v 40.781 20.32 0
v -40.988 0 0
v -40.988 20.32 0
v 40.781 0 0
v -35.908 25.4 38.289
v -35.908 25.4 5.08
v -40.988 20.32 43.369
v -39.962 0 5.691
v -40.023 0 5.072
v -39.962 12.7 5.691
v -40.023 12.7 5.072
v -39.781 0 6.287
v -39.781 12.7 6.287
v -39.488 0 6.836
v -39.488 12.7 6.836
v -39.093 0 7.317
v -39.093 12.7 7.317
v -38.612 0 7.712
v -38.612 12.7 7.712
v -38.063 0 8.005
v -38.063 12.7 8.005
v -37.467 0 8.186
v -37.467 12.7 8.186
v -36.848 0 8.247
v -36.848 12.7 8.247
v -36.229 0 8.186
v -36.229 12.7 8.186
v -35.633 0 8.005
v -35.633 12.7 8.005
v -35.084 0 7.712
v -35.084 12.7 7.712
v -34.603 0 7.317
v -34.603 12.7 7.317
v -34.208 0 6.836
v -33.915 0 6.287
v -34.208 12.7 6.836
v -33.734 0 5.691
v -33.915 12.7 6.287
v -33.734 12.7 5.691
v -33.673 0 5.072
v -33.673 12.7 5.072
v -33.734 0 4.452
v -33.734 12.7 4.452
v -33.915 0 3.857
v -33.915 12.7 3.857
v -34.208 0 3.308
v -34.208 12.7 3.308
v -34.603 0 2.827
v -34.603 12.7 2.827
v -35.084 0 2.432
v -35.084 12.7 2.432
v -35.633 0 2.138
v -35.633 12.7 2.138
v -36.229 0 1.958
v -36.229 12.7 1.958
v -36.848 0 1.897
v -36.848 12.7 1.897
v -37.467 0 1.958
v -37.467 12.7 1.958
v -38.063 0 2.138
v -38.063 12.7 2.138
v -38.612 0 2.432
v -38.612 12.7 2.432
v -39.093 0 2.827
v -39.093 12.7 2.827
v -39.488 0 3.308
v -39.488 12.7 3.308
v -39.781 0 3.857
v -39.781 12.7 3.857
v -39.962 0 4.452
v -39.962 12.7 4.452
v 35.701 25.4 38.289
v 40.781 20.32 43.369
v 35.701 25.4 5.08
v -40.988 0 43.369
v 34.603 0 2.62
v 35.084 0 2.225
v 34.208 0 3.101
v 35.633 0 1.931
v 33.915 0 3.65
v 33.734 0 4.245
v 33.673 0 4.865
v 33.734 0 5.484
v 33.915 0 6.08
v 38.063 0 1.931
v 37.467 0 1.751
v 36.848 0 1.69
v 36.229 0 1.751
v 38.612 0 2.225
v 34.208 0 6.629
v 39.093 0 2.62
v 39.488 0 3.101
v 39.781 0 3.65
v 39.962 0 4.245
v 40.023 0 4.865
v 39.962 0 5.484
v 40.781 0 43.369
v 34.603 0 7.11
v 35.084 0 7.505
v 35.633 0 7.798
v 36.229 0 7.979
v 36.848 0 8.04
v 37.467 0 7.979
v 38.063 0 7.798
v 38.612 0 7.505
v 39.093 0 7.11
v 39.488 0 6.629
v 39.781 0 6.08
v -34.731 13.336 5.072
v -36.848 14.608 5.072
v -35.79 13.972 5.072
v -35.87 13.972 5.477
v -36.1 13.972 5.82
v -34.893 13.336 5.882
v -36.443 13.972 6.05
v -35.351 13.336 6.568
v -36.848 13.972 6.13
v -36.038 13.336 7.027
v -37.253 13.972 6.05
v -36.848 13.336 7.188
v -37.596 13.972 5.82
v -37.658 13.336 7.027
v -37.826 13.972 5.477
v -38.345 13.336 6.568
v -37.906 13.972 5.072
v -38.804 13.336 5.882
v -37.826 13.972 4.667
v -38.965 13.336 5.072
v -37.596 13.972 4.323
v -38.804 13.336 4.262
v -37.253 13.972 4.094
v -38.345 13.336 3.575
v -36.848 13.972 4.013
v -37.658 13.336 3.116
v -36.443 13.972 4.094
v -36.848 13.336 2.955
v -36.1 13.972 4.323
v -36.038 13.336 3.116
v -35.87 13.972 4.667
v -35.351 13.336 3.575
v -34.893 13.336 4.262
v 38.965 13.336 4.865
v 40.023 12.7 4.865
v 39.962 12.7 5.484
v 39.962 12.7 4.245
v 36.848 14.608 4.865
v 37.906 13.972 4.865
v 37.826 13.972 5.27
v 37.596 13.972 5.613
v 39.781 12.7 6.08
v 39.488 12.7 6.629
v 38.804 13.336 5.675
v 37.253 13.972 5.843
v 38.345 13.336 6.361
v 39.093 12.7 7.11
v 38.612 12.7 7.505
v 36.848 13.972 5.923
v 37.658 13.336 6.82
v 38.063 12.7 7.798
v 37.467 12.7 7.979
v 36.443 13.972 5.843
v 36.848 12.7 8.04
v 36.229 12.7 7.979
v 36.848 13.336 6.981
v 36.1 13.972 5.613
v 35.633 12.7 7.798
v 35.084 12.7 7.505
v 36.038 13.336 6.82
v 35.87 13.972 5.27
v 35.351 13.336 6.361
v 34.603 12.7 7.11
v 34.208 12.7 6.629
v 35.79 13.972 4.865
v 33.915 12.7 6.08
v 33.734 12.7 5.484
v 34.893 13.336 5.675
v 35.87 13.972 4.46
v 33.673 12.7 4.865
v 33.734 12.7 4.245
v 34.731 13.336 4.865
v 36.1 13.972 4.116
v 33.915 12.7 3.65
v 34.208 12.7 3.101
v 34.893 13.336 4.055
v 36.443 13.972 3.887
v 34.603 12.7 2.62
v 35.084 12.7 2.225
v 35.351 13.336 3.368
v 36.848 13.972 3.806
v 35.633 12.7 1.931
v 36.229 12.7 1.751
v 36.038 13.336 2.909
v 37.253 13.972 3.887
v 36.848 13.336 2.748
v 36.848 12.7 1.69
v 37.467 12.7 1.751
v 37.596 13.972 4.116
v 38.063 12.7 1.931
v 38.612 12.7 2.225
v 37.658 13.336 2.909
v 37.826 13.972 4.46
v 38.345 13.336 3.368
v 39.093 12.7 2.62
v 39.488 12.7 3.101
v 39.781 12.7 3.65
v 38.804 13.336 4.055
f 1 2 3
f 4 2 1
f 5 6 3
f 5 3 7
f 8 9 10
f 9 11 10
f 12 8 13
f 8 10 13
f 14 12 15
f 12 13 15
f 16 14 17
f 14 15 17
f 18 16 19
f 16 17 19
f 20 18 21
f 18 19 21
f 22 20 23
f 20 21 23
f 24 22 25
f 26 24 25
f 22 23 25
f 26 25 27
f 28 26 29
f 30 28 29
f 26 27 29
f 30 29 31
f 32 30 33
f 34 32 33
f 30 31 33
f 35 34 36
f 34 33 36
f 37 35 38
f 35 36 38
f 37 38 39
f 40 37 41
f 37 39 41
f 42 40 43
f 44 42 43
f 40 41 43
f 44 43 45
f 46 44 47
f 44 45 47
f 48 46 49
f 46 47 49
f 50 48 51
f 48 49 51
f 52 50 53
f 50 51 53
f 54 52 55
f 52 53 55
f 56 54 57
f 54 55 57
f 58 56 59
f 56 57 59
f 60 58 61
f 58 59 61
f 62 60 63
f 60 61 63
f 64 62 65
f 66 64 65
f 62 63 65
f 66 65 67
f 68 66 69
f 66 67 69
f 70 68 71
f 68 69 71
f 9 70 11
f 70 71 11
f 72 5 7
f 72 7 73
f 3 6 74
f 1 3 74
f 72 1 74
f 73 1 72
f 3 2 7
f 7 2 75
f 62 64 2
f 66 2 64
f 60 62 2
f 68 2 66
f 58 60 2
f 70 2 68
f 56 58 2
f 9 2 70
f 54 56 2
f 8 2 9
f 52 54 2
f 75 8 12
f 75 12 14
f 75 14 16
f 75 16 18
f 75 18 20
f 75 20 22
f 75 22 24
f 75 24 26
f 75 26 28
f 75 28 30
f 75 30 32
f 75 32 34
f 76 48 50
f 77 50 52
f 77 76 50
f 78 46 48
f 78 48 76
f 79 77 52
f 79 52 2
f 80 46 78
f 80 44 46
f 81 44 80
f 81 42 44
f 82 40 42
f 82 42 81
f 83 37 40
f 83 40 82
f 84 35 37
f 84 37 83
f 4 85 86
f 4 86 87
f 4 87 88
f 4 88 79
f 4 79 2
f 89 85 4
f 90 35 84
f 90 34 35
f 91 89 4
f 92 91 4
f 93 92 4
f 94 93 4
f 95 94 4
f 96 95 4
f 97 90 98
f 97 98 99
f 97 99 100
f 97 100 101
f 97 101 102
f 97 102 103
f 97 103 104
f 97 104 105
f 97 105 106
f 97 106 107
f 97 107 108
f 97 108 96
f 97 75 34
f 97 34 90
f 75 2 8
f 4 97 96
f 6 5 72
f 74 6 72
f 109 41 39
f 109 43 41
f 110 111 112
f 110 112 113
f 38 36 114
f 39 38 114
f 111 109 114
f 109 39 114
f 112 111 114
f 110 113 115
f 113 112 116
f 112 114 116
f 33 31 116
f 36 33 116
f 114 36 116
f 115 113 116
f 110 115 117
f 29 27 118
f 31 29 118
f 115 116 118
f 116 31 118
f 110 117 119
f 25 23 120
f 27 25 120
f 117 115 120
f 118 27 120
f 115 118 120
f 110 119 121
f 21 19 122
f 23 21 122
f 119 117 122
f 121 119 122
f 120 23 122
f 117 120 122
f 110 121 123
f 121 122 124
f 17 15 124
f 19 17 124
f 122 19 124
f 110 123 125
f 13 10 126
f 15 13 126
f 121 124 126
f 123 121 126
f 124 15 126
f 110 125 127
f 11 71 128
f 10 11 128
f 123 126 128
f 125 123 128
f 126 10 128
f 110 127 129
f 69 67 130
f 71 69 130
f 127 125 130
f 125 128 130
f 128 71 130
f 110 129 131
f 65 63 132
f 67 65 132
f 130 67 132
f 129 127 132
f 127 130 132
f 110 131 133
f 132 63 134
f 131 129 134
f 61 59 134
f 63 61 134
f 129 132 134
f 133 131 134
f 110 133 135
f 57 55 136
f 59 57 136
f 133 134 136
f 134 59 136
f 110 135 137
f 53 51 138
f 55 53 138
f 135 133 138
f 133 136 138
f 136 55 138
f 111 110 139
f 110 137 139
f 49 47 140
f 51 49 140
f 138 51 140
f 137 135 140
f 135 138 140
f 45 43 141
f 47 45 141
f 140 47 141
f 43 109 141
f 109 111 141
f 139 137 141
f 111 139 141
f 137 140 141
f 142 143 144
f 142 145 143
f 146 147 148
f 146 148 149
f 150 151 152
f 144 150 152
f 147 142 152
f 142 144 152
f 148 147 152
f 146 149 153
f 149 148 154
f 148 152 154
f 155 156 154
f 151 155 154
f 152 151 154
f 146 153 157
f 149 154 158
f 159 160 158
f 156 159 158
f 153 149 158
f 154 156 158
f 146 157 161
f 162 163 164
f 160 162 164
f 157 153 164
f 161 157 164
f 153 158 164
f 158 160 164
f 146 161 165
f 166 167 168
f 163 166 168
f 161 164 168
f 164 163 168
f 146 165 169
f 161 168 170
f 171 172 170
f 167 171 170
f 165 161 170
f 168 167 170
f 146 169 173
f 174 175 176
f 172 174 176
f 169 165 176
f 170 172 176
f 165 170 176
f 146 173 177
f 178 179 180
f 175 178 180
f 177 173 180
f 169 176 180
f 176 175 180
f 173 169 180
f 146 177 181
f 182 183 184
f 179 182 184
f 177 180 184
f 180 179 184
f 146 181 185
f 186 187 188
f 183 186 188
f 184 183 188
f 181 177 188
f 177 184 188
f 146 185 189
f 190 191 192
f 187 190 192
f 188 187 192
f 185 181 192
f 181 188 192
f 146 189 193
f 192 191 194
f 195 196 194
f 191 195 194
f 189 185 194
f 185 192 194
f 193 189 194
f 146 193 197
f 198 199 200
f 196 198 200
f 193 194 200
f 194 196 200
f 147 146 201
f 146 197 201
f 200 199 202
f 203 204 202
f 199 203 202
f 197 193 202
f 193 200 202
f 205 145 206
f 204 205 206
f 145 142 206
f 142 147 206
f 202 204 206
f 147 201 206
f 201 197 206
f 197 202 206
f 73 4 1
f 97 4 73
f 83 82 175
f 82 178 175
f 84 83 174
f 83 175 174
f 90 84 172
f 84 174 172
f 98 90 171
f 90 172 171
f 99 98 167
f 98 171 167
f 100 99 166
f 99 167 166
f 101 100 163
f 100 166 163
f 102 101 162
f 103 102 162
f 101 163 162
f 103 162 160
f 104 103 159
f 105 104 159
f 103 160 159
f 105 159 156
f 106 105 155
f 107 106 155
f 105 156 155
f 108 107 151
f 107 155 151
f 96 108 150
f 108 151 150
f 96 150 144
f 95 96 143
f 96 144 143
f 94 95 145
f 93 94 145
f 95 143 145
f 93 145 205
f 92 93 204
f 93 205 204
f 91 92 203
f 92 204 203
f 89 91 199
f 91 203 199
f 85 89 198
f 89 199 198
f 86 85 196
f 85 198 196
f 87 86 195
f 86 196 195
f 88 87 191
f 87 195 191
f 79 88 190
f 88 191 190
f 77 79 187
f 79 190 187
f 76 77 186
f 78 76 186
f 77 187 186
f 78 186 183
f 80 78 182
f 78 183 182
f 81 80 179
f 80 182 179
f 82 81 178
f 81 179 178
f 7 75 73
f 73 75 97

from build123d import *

# Parameters (mm, degrees)
F0_W     = 81.7696005106
F0_H     = 43.3689393103
F1_DEPTH = 25.4
F3_D     = 6.35
F3_DEPTH = 12.7
F3_TIP   = 1.9077324654
F5_SIZE  = 5.08


# Not quite as in the source:
# - the program builds the solid bodies; features that only make, move or delete a surface that nothing else refers to are left out


with BuildPart() as f1:
    # F0 (on Front) → F1 (new body)
    with BuildSketch(Plane.XZ):
        with Locations((-0.1035071909, 21.6844696552)):
            Rectangle(F0_W, F0_H)
    extrude(amount=-F1_DEPTH)

    # F3
    with Locations(Plane.XZ):
        with Locations((36.8480719626, 4.8647737131), (-36.8480719626, 5.071785301)):
            Hole(F3_D / 2, depth=F3_DEPTH)
            with Locations((0, 0, -(F3_DEPTH + F3_TIP / 2))):  # 118° drill point
                Cone(0, F3_D / 2, F3_TIP, mode=Mode.SUBTRACT)

    # F5
    f5_edges = [f1.edges().sort_by_distance(p)[0] for p in [
        (-40.988307, 25.4, 21.68447),
        (-0.103507, 25.4, 0),
        (40.781293, 25.4, 21.68447),
        (-0.103507, 25.4, 43.368939),
    ]]
    chamfer(f5_edges, length=F5_SIZE)


solid = f1.part
